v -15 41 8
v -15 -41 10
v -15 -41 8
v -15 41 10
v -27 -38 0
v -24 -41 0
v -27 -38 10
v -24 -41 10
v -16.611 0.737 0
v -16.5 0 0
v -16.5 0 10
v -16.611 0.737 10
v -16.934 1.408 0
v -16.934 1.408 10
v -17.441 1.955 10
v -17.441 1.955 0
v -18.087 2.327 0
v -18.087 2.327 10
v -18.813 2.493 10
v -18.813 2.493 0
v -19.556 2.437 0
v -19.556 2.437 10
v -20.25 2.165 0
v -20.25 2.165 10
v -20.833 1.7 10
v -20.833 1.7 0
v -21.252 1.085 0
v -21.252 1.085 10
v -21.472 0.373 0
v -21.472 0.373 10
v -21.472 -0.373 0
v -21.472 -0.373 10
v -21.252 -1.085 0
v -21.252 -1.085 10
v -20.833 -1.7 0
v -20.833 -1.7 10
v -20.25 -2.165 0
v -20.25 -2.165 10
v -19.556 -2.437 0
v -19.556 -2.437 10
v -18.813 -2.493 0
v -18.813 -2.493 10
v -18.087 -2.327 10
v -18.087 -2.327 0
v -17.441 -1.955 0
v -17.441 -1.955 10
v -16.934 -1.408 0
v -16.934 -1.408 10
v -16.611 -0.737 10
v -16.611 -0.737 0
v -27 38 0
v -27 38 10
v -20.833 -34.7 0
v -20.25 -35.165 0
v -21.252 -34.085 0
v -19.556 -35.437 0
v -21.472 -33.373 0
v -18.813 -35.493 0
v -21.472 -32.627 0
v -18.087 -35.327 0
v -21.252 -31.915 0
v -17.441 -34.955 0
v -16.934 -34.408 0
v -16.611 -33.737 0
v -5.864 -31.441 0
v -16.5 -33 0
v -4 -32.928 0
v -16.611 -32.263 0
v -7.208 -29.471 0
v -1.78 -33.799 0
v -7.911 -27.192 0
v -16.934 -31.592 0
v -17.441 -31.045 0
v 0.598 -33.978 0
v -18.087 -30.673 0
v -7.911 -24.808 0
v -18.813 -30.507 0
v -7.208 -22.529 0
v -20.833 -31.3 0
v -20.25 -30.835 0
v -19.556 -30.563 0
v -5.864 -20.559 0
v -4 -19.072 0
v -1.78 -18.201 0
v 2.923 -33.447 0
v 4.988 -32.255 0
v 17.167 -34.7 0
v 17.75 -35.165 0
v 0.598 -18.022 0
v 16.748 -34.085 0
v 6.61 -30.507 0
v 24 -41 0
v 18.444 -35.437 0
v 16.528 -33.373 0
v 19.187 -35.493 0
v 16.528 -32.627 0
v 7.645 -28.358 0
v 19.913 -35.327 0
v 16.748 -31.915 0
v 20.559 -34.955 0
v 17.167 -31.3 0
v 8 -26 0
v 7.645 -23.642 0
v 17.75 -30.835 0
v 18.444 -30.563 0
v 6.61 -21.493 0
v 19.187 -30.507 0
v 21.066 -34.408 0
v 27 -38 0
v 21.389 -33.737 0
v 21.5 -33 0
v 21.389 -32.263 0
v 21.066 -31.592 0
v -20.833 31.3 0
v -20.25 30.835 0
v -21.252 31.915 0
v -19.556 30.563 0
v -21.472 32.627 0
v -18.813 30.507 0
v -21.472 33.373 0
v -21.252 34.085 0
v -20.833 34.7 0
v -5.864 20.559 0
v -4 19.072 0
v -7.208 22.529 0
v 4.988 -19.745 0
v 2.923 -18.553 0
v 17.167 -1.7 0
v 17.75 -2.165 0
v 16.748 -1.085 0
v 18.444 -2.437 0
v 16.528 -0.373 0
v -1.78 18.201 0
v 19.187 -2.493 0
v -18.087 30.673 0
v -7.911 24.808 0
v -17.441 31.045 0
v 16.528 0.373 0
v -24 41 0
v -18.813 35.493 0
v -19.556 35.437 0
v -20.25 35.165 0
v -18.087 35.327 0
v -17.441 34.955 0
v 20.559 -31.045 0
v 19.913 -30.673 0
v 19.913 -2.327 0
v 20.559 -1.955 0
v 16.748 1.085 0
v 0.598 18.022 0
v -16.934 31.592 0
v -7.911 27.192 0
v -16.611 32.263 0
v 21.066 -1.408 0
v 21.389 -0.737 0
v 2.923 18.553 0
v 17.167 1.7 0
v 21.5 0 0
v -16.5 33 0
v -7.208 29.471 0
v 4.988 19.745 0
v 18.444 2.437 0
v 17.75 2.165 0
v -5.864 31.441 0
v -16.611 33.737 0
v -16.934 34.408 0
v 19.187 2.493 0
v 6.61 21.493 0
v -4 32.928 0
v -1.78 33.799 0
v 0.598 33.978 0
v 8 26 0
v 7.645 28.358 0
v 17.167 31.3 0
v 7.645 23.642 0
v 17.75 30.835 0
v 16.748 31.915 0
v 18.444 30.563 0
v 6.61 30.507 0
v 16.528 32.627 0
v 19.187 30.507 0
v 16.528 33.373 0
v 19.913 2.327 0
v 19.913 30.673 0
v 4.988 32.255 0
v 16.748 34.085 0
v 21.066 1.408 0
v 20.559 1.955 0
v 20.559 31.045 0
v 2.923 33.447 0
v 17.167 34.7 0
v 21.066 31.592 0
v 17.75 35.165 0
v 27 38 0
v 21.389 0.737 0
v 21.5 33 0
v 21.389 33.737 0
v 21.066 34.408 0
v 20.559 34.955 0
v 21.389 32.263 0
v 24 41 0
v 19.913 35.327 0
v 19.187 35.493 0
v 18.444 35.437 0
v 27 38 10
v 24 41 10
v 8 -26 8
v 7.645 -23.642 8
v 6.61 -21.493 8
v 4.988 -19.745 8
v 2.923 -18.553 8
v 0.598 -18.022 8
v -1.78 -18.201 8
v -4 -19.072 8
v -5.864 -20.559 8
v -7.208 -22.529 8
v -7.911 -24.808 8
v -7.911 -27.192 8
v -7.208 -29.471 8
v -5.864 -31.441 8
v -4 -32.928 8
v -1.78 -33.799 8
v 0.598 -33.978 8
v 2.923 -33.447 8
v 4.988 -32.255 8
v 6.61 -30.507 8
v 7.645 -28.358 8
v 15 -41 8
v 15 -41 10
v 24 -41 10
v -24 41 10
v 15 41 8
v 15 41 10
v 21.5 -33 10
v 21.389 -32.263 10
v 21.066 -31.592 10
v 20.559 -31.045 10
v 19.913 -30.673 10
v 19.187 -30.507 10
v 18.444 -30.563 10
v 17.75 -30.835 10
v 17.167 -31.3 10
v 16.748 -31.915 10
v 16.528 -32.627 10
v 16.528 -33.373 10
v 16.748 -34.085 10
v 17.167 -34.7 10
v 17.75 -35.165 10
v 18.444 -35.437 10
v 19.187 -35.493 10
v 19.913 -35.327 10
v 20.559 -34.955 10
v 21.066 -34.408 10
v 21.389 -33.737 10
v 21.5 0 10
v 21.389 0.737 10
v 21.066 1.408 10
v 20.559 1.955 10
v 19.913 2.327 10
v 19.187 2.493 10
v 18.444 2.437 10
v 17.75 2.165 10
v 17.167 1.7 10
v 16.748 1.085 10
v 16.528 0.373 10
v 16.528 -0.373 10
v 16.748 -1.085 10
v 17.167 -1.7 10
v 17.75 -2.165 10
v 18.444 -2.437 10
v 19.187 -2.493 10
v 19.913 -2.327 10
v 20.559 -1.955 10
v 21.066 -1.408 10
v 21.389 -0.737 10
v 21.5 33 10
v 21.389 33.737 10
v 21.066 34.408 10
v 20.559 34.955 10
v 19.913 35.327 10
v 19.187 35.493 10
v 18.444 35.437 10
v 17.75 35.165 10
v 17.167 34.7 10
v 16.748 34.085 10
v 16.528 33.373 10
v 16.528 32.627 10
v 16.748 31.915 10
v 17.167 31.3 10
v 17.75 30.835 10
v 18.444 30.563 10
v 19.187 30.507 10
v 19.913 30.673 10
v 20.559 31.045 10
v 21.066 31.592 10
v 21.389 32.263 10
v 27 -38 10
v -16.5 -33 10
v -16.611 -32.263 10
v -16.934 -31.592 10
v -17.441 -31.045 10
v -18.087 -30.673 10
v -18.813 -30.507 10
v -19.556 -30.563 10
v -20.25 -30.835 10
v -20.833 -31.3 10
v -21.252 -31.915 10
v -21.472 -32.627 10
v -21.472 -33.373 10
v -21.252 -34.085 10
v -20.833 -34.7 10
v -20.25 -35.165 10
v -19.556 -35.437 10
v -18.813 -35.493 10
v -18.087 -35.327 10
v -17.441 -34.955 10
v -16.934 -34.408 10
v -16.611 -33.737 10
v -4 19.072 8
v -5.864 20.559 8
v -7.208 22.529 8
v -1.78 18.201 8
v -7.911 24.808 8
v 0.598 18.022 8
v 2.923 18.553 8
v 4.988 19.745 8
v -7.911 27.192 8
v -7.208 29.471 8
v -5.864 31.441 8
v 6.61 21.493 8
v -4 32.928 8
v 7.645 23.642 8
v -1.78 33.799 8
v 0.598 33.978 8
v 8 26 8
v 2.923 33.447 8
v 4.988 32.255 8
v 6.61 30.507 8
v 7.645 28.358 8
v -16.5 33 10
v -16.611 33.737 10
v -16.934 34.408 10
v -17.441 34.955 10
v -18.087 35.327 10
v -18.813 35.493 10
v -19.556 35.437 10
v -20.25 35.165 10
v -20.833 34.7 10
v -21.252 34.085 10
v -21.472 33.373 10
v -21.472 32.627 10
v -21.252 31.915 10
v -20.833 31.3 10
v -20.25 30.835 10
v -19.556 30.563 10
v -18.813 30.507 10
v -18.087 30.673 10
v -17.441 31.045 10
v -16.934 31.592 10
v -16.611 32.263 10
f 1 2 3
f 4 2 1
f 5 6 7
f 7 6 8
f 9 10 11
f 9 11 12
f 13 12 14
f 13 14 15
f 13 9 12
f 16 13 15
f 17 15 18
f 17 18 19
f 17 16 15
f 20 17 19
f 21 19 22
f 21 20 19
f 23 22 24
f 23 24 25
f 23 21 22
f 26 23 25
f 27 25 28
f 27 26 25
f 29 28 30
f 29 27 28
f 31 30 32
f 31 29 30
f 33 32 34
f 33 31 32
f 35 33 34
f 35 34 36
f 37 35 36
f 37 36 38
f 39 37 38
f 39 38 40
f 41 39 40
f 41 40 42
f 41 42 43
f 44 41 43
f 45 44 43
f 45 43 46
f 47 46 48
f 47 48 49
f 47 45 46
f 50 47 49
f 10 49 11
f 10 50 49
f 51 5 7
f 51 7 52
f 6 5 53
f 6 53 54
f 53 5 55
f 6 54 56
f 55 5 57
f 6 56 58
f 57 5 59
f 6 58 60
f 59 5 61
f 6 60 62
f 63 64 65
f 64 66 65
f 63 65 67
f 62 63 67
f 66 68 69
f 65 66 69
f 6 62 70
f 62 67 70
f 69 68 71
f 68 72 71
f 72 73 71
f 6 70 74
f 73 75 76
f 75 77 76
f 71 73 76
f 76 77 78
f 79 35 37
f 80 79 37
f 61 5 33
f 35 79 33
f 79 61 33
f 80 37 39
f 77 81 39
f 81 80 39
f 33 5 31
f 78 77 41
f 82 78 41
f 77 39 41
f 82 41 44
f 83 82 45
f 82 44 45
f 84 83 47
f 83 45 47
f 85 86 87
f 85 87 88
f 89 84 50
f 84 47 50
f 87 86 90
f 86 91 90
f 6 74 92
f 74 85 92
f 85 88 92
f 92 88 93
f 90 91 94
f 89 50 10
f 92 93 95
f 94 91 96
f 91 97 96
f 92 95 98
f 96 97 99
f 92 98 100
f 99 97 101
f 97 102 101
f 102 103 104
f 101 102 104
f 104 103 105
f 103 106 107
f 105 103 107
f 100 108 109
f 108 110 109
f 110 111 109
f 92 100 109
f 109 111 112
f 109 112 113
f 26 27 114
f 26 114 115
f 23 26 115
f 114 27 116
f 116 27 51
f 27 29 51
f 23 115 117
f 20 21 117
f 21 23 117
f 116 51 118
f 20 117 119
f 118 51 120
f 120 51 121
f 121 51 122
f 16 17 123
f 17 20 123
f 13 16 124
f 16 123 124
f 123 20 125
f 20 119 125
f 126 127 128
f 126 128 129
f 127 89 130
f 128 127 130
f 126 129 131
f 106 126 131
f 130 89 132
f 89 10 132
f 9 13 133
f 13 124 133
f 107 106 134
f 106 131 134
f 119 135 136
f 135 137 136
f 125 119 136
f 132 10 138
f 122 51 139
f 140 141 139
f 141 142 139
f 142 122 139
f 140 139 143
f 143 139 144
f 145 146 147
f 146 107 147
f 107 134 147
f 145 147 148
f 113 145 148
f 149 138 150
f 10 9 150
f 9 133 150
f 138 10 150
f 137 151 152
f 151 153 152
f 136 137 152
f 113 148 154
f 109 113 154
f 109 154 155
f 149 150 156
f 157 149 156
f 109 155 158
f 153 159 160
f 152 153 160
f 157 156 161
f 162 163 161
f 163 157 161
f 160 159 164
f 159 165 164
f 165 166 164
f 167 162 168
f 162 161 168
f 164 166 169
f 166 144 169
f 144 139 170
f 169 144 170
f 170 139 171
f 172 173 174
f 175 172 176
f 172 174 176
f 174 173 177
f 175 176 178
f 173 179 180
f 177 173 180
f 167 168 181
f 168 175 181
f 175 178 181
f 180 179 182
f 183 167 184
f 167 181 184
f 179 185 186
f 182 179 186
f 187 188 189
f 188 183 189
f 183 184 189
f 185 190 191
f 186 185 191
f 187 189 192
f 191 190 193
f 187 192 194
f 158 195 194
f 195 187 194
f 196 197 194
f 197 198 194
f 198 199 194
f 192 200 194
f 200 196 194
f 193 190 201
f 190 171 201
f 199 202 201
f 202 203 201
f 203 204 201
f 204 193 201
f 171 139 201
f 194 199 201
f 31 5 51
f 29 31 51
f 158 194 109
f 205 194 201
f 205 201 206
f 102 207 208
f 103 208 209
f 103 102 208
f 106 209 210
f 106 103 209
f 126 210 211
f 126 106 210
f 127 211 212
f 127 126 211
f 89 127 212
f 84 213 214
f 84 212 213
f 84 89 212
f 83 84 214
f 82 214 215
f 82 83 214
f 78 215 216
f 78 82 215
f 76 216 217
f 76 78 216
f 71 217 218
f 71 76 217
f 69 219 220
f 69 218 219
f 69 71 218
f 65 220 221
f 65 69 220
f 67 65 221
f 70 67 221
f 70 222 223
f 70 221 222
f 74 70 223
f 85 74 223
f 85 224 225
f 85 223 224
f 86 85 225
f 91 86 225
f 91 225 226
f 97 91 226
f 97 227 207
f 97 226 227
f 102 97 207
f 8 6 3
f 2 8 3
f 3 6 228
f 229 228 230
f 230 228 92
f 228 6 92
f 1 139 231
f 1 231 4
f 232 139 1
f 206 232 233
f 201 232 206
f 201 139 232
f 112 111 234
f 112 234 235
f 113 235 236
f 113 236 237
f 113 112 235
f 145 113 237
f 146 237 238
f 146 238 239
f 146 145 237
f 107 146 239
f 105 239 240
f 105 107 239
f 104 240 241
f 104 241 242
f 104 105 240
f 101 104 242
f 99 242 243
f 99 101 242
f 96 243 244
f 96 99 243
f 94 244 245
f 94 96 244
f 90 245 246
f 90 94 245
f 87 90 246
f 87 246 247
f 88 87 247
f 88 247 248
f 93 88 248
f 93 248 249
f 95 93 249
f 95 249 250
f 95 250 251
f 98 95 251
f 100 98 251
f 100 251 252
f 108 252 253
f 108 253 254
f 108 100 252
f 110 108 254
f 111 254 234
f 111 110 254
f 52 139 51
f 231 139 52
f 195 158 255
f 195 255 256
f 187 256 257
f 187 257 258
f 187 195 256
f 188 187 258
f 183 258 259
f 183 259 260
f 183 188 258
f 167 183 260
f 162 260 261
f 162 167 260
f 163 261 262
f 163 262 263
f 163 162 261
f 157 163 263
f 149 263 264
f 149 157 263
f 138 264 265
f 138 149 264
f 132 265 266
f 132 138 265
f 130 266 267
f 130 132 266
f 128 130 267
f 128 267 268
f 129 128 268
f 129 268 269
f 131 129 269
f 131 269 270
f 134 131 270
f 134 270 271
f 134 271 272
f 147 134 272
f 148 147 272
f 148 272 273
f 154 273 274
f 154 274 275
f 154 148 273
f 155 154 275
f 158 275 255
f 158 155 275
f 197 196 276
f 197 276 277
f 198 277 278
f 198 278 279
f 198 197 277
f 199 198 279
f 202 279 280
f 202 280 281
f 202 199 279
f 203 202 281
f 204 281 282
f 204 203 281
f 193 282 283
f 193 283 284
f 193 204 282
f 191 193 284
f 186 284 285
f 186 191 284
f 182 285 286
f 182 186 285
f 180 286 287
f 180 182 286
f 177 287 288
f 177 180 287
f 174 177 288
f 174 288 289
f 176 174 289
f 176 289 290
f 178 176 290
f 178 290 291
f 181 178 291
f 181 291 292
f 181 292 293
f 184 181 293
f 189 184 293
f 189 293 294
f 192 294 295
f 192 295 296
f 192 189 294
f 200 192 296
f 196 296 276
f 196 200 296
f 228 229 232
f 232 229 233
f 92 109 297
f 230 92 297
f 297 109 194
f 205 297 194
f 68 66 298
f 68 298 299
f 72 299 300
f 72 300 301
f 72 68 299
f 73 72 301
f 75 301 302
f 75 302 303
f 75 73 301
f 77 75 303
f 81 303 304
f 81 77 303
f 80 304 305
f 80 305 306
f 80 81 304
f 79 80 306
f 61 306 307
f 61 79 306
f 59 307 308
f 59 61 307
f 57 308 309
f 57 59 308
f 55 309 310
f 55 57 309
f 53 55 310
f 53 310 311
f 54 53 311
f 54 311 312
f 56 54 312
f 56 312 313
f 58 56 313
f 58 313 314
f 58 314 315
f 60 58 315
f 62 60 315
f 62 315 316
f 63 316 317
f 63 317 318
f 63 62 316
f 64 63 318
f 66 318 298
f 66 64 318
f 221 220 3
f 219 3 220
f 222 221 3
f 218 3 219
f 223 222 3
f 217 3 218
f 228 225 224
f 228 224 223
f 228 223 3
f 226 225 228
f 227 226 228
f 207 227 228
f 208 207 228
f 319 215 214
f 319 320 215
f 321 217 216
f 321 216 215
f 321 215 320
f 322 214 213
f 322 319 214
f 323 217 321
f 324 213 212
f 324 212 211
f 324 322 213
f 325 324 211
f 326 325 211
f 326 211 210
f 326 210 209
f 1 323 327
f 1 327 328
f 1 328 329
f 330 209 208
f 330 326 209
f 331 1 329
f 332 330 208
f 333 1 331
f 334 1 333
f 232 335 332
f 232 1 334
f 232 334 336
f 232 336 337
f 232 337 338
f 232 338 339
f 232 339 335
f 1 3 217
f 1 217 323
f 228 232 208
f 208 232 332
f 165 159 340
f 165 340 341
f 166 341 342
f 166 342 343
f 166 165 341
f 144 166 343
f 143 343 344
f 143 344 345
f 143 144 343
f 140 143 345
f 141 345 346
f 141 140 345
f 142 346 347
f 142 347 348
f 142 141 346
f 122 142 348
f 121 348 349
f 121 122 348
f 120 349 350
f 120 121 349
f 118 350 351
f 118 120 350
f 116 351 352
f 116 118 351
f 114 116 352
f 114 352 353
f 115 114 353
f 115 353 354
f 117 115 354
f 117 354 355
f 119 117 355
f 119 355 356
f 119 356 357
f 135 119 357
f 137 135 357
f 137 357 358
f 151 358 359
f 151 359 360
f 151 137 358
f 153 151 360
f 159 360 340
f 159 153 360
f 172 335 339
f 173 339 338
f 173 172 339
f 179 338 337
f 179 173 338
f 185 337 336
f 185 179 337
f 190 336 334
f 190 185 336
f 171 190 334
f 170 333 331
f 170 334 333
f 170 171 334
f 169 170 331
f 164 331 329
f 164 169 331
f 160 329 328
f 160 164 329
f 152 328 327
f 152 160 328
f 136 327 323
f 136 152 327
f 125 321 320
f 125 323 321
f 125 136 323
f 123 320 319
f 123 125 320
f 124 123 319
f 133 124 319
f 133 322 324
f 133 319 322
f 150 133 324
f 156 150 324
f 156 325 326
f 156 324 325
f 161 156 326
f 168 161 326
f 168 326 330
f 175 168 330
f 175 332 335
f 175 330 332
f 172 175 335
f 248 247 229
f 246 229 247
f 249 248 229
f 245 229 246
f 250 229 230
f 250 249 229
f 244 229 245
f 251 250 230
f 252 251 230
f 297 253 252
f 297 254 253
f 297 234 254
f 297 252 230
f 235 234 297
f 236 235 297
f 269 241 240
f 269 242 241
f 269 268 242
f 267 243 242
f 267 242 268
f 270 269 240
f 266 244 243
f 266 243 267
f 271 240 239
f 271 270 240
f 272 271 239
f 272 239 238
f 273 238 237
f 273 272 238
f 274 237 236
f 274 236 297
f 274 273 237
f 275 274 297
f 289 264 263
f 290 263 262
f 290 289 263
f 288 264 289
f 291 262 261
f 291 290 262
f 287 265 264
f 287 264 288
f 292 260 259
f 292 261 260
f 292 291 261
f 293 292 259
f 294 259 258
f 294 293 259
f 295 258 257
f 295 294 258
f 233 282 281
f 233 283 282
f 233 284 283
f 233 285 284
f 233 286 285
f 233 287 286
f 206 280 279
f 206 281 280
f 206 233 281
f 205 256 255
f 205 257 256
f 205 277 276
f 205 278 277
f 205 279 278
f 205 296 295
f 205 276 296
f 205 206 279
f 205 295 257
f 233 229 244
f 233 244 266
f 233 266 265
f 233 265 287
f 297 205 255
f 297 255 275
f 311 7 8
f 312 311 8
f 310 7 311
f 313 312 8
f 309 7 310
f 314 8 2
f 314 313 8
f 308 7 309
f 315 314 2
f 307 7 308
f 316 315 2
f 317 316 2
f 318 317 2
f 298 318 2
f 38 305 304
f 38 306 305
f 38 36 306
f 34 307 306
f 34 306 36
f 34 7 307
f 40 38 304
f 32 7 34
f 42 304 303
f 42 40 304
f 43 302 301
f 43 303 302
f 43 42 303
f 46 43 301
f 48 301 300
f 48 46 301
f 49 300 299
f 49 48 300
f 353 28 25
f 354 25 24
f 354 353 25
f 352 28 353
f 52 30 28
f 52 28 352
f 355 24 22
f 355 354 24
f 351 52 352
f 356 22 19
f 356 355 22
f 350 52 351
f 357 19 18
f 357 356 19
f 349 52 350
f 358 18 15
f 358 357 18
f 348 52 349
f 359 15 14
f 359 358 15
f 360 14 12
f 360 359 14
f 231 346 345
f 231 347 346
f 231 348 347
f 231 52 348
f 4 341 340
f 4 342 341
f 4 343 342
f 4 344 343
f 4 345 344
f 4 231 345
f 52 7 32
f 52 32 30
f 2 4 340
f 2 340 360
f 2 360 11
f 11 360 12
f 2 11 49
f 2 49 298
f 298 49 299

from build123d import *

# Parameters (mm, degrees)
F0_W     = 54
F0_H     = 82
F0_R     = 2.5
F0_R_2   = 8
F1_DEPTH = 10
F2_SIZE  = 3
F3_W     = 30
F3_H     = 82
F4_DEPTH = 2


with BuildPart() as f1:
    # F0 (on Top) → F1 (new body)
    with BuildSketch(Plane.XY):
        Rectangle(F0_W, F0_H)
        with Locations((-19, -33)):
            Circle(F0_R, mode=Mode.SUBTRACT)
        with Locations((0, -26)):
            Circle(F0_R_2, mode=Mode.SUBTRACT)
        with Locations((19, -33)):
            Circle(F0_R, mode=Mode.SUBTRACT)
        with Locations((-19, 0)):
            Circle(F0_R, mode=Mode.SUBTRACT)
        with Locations((-19, 33)):
            Circle(F0_R, mode=Mode.SUBTRACT)
        with Locations((19, 0)):
            Circle(F0_R, mode=Mode.SUBTRACT)
        with Locations((0, 26)):
            Circle(F0_R_2, mode=Mode.SUBTRACT)
        with Locations((19, 33)):
            Circle(F0_R, mode=Mode.SUBTRACT)
    extrude(amount=F1_DEPTH)

    # F2
    f2_edges = [f1.edges().sort_by_distance(p)[0] for p in [
        (27, -41, 5),
        (-27, -41, 5),
        (27, 41, 5),
        (-27, 41, 5),
    ]]
    chamfer(f2_edges, length=F2_SIZE)

    # F3 (on face) → F4 (cut)
    with BuildSketch(Plane.XY.offset(10)):
        Rectangle(F3_W, F3_H)
    extrude(amount=-F4_DEPTH, mode=Mode.SUBTRACT)


solid = f1.part
